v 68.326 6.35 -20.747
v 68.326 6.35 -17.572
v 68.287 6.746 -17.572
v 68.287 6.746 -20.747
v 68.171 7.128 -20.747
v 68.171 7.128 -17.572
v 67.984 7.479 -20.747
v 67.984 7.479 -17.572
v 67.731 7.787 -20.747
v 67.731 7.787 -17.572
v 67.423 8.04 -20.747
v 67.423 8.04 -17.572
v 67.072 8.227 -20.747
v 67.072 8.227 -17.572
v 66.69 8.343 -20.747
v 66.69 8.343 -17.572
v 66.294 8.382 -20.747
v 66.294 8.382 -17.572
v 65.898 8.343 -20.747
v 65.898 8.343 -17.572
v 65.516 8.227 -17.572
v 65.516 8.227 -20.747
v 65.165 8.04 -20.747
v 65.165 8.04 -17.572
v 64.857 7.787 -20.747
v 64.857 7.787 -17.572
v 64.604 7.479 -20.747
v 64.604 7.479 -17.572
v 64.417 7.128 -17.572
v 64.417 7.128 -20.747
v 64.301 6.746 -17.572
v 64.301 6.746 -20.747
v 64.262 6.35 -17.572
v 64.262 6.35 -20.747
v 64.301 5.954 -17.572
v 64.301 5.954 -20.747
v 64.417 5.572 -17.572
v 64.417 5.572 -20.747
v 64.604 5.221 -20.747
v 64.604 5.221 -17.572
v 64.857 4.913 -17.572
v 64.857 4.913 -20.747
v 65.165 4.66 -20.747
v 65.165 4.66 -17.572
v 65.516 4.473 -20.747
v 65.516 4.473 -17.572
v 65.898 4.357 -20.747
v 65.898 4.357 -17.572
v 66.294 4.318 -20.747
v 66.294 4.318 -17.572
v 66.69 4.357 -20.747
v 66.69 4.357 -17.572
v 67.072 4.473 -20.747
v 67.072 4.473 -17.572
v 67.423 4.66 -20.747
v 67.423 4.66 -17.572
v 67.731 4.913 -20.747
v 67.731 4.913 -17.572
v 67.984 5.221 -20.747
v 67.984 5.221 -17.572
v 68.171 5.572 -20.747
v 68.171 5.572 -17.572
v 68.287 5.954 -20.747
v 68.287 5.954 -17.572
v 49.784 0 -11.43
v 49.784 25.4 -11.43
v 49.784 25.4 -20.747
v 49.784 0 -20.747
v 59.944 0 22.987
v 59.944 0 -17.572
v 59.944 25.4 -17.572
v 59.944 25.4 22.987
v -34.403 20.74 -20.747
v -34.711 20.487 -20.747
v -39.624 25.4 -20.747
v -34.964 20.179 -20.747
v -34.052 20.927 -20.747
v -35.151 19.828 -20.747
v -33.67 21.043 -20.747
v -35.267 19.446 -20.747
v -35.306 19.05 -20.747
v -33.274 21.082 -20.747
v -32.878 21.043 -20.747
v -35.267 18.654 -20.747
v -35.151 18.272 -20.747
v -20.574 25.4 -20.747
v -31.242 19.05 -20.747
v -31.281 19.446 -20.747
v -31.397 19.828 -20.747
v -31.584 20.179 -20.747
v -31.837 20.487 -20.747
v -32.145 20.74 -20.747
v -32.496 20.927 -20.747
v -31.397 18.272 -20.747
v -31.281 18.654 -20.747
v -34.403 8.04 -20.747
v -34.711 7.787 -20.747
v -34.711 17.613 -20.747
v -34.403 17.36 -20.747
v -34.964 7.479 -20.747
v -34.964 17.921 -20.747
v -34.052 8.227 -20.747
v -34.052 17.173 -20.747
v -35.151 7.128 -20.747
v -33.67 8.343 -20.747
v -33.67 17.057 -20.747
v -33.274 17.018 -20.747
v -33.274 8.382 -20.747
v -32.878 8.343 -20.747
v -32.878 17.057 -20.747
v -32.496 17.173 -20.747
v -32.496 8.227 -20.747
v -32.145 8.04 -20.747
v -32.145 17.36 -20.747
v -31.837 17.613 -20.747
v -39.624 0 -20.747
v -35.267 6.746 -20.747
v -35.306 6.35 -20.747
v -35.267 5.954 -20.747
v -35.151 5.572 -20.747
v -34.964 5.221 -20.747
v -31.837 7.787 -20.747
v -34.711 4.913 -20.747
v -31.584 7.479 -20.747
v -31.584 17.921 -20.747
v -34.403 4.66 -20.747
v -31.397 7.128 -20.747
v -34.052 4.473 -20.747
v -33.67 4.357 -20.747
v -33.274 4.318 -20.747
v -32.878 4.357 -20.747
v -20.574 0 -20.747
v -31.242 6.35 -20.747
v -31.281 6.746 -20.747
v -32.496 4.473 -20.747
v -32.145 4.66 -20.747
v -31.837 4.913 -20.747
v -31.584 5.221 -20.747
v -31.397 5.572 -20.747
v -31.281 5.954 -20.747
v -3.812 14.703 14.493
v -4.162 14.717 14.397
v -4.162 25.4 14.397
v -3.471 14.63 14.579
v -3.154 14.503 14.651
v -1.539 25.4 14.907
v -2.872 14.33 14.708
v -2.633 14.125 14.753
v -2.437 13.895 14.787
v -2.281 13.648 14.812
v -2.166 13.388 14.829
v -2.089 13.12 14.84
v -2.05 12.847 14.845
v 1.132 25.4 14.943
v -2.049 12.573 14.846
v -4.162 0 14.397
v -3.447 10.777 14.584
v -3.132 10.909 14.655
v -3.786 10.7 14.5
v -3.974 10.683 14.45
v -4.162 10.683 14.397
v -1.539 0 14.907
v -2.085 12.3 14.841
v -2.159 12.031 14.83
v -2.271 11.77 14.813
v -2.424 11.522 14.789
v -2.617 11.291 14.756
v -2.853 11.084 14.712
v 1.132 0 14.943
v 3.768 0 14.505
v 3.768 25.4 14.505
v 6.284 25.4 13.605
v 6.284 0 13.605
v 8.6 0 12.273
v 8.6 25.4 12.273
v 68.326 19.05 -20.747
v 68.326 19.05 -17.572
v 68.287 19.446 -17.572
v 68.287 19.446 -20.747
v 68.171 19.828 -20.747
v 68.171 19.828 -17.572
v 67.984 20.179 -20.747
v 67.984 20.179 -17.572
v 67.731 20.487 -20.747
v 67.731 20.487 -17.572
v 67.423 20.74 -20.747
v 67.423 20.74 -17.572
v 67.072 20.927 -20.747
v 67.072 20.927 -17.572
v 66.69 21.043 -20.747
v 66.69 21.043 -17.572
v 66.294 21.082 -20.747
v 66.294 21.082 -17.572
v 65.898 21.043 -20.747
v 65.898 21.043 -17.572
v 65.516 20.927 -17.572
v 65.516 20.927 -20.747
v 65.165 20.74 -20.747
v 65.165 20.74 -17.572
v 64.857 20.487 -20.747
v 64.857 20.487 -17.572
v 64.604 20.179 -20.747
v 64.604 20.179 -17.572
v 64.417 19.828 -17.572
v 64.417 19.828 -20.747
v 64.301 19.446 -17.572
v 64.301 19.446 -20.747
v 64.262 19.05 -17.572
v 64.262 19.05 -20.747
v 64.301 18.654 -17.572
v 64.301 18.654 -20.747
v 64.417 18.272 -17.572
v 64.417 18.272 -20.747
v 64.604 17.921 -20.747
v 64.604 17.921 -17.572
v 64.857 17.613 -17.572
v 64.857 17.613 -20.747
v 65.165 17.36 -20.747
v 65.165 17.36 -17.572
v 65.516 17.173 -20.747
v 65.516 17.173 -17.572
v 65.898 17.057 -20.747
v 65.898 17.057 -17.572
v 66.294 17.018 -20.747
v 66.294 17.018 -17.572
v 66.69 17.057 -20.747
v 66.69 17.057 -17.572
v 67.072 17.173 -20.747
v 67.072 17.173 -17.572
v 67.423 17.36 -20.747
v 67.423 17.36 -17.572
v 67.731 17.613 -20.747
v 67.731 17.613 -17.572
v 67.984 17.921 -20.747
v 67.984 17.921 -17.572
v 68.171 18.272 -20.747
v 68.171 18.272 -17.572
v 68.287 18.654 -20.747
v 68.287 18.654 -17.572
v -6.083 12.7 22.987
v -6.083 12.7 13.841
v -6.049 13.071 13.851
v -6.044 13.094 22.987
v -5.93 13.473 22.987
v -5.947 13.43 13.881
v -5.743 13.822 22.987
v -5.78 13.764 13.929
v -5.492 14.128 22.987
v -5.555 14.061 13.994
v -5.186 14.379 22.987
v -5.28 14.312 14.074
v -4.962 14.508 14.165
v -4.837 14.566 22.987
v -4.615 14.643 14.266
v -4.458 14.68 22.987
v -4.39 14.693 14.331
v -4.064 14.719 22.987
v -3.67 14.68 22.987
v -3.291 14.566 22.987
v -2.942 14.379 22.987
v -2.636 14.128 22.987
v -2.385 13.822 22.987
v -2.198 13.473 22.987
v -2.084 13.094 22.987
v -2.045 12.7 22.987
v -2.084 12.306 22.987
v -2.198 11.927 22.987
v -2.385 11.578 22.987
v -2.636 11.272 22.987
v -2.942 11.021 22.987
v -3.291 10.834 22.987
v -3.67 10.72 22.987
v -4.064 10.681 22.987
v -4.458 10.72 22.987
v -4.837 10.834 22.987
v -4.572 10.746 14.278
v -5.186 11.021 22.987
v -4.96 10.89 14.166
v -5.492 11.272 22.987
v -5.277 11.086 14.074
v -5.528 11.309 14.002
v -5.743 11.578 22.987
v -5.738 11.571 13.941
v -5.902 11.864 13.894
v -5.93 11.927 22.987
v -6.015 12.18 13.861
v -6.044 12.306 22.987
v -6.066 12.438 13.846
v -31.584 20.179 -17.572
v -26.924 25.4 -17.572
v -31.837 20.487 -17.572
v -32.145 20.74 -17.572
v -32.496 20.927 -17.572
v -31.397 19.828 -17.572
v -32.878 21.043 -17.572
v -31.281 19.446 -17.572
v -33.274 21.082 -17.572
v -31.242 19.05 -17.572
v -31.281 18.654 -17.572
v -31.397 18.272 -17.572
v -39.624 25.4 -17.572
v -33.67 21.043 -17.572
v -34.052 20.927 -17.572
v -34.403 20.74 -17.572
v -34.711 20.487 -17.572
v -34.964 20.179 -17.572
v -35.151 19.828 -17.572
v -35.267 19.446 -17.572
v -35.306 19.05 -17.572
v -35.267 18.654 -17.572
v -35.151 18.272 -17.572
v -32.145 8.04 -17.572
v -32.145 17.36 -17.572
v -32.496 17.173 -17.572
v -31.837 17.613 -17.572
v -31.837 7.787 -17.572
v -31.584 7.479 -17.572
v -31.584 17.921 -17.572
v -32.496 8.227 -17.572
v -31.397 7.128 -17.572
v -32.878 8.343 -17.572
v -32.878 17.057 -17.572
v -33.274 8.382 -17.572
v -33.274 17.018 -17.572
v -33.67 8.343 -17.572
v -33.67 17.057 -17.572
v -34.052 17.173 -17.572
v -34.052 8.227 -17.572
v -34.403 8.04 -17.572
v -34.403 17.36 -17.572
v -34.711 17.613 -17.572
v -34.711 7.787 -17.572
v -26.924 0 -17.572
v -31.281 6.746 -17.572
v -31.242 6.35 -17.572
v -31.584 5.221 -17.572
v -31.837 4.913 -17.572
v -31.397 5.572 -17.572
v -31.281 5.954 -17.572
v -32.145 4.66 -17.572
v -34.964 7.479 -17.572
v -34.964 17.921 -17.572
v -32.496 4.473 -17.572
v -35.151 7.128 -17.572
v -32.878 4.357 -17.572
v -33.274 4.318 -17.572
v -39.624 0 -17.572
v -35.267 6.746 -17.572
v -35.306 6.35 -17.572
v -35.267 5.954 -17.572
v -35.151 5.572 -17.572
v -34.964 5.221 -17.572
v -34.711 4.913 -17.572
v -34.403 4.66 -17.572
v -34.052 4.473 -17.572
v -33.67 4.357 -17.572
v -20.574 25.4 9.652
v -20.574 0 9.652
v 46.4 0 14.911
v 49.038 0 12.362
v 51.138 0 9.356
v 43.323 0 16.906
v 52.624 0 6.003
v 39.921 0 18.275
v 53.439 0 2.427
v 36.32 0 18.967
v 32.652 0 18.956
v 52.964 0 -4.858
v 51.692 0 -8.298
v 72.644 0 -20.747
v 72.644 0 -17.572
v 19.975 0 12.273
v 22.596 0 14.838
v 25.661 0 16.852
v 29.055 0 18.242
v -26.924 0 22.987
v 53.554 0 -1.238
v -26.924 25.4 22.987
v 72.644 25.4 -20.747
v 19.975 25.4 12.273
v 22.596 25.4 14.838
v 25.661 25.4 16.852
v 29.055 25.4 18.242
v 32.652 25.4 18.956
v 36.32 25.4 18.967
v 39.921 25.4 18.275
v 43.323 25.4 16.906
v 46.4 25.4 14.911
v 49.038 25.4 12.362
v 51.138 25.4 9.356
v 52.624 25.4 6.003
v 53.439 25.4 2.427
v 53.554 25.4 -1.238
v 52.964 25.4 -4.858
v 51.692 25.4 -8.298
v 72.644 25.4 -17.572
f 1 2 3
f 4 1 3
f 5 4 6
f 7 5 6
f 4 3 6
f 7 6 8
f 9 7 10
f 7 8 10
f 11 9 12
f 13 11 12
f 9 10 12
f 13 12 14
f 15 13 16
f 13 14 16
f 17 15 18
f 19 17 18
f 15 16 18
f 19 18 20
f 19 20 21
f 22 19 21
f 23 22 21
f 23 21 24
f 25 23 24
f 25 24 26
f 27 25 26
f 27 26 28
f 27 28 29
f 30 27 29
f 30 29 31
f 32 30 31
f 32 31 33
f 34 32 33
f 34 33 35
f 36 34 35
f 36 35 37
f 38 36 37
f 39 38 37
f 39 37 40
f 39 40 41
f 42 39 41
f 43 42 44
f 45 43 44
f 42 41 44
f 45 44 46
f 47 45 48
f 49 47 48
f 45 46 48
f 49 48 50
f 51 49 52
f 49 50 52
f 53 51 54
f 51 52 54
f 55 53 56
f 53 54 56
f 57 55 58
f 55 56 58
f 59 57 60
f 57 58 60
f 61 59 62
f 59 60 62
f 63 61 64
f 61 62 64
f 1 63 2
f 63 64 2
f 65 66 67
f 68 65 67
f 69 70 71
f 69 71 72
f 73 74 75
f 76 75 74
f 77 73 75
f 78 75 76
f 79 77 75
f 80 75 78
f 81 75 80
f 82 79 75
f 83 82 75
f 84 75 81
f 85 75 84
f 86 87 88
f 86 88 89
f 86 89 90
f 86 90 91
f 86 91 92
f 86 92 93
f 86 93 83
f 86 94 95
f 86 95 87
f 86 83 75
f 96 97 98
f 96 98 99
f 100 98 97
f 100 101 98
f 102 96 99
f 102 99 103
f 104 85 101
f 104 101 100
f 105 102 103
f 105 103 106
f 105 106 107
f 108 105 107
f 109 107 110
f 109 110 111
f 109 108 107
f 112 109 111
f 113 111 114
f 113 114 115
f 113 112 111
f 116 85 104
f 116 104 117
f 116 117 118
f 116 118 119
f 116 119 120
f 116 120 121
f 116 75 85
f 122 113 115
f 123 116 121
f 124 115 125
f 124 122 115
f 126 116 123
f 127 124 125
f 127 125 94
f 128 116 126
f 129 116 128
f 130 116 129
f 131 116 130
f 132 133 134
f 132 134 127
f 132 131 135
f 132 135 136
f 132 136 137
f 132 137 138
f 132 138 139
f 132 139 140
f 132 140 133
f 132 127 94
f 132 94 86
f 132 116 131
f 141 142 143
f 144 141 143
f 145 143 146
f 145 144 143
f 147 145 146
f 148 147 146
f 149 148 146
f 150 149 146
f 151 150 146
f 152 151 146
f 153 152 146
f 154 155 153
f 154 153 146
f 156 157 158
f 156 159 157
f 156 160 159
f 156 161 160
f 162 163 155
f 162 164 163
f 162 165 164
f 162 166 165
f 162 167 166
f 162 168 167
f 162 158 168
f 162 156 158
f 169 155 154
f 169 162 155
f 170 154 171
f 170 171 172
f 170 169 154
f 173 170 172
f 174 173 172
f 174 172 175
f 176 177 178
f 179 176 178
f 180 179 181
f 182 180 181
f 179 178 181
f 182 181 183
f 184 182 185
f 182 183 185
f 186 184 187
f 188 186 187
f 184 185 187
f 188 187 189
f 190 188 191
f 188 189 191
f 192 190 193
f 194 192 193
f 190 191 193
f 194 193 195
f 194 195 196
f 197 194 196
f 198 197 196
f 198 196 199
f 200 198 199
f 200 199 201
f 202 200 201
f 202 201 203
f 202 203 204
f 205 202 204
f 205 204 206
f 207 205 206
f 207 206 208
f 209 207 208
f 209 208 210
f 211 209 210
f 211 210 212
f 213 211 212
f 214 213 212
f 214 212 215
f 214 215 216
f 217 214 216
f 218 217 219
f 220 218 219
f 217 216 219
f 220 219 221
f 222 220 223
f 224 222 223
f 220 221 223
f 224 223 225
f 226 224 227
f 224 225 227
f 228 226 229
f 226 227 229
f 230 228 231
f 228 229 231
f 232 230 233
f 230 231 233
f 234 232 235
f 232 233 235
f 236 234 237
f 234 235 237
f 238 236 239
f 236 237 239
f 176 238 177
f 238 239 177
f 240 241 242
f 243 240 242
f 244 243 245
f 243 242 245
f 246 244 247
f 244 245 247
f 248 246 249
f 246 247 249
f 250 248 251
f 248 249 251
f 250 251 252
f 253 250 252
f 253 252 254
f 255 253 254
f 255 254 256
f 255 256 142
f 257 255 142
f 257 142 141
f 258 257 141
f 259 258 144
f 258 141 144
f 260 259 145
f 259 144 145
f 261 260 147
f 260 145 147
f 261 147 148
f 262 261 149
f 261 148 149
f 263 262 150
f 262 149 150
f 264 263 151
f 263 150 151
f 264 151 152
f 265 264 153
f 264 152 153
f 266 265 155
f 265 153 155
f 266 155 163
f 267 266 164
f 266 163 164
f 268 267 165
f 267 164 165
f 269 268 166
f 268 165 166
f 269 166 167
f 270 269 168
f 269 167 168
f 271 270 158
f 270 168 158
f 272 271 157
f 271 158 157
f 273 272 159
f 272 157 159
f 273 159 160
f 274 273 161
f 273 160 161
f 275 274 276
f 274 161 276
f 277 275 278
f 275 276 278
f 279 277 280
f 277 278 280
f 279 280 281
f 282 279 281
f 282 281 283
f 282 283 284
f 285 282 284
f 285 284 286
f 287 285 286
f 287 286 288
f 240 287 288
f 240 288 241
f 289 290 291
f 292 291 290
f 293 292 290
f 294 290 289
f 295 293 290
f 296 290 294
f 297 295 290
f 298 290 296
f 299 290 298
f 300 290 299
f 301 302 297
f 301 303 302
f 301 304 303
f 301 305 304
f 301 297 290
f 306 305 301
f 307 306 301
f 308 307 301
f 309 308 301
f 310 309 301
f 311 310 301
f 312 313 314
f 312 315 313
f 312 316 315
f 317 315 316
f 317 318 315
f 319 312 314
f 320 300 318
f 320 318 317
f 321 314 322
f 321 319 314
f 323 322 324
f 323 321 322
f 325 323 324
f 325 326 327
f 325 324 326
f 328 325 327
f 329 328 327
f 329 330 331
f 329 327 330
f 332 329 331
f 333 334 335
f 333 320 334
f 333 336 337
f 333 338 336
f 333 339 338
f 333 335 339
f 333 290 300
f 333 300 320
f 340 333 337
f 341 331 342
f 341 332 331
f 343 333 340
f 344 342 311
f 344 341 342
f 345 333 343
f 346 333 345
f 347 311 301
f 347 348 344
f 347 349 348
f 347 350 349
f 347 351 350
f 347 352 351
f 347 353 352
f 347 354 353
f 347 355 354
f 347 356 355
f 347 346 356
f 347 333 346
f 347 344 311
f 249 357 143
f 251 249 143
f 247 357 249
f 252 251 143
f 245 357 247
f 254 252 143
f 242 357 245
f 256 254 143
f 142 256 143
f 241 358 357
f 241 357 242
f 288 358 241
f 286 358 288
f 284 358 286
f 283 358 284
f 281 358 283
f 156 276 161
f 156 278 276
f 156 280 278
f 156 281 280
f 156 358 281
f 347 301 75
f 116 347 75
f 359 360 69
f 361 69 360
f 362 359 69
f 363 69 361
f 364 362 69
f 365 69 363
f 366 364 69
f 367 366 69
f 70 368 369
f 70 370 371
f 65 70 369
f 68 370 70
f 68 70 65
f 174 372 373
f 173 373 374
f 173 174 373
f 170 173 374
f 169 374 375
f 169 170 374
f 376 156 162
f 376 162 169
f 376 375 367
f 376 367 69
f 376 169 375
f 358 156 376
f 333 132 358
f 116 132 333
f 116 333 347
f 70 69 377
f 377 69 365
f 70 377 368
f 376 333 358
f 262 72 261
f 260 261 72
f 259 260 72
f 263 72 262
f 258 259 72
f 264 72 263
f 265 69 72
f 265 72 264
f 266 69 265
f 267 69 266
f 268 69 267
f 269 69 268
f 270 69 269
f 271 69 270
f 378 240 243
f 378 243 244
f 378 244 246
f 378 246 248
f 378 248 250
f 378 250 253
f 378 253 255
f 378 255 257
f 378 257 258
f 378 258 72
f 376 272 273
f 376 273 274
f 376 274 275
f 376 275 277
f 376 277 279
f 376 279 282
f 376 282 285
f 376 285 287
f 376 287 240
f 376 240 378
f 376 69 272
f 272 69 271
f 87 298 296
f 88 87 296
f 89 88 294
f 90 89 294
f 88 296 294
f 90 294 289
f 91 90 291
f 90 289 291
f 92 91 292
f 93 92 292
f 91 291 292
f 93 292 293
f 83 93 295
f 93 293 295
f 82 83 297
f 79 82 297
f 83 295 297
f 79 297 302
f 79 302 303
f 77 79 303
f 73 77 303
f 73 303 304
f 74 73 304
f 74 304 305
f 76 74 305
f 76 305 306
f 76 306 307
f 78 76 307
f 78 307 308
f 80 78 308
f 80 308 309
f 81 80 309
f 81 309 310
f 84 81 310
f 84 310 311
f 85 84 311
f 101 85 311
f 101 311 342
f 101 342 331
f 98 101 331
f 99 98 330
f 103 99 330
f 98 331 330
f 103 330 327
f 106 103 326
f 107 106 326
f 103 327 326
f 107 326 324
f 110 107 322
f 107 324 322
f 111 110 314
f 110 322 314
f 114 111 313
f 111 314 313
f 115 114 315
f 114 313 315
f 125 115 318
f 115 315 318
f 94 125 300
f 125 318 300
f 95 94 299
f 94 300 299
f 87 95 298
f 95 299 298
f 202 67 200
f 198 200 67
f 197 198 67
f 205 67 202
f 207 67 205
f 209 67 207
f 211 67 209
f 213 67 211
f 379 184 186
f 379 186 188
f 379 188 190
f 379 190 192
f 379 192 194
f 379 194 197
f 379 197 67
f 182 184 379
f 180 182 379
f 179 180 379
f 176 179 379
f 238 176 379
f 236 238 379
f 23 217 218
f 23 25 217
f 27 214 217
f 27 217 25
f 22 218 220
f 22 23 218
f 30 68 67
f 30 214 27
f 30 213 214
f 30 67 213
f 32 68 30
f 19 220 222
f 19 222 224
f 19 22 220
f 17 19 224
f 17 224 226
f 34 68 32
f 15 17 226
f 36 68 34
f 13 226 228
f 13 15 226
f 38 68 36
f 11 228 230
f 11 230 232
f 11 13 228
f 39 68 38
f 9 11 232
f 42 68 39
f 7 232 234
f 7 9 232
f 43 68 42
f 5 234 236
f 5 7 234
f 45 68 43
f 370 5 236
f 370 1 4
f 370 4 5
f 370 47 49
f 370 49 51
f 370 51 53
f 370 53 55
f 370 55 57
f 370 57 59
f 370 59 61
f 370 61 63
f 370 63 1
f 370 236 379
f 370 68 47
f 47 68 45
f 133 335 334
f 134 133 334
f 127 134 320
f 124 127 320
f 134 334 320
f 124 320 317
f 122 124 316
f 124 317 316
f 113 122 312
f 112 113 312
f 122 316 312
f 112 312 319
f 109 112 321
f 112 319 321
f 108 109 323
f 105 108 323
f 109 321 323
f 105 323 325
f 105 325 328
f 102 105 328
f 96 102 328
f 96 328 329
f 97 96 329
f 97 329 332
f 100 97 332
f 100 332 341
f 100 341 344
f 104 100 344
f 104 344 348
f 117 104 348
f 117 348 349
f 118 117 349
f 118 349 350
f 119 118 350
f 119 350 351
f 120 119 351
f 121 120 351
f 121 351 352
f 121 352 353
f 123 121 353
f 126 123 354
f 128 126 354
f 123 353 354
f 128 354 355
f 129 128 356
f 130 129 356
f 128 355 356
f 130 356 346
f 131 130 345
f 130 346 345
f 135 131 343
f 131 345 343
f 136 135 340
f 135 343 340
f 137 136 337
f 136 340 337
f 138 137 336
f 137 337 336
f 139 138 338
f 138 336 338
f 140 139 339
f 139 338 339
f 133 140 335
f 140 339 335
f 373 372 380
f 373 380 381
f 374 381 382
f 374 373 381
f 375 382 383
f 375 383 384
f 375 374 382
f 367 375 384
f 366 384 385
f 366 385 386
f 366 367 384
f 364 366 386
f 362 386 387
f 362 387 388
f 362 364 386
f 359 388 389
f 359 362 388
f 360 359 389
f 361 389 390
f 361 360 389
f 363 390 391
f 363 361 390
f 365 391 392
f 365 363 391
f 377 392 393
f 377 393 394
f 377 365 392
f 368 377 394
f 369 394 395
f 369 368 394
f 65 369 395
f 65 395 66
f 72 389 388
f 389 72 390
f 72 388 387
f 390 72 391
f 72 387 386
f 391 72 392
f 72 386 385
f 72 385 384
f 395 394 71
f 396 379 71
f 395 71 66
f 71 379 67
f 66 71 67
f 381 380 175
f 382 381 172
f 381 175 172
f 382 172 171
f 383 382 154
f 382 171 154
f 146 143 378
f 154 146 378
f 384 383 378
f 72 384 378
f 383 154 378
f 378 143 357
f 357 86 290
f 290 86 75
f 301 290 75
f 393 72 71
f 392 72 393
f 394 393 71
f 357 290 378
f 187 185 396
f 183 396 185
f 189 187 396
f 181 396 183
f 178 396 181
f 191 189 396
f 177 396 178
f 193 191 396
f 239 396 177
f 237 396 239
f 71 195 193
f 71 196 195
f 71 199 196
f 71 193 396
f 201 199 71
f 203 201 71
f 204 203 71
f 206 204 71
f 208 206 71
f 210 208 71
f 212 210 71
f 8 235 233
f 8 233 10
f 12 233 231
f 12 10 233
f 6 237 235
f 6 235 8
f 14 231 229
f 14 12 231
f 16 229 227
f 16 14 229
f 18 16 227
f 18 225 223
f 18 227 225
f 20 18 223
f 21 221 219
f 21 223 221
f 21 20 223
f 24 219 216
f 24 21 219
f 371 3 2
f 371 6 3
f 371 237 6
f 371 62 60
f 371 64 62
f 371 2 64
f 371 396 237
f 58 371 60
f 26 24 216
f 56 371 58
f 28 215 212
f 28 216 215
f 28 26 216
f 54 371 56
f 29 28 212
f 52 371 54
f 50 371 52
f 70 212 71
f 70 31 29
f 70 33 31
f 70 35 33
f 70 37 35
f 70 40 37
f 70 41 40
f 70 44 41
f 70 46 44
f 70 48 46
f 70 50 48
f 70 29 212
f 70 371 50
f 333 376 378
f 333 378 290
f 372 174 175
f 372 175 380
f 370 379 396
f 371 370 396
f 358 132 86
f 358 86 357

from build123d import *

# Parameters (mm, degrees)
BOSS_EXTRUDE1_DEPTH    = 25.4
SKETCH2_R              = 2.032
CUT_EXTRUDE1_DEPTH     = 87.9904043
F_10_32_TAPPED_HOLE1_D = 4.0386


with BuildPart() as part:
    # Sketch1 → Boss-Extrude1 (new body)
    with BuildSketch(Plane(origin=(0, 0, 0), x_dir=(1, 0, 0), z_dir=(0, 1, 0))):
        with BuildLine():
            Line((-20.574, -9.652129604), (-4.162019583, -14.39674322))
            ThreePointArc((-4.162019583, -14.39674322), (2.459785533, -14.783033433), (8.59971196, -12.273287113))
            Line((8.59971196, -12.273287113), (19.974548279, -12.273287113))
            ThreePointArc((19.974548279, -12.273287113), (46.400384935, -14.910688658), (49.784, 11.43))
            Line((49.784, 11.43), (49.784, 20.746712887))
            Line((49.784, 20.746712887), (72.644, 20.746712887))
            Line((72.644, 20.746712887), (72.644, 17.571712887))
            Line((72.644, 17.571712887), (59.944, 17.571712887))
            Line((59.944, 17.571712887), (59.944, -12.827129604))
            Line((59.944, -12.827129604), (59.944, -22.987129604))
            Line((59.944, -22.987129604), (-26.924, -22.987129604))
            Line((-26.924, -22.987129604), (-26.924, -12.827129604))
            Line((-26.924, -12.827129604), (-26.924, 17.571712887))
            Line((-26.924, 17.571712887), (-39.624, 17.571712887))
            Line((-39.624, 17.571712887), (-39.624, 20.746712887))
            Line((-39.624, 20.746712887), (-20.574, 20.746712887))
            Line((-20.574, 20.746712887), (-20.574, 9.652))
            Line((-20.574, 9.652), (-20.574, -9.652129604))
        make_face()
    extrude(amount=BOSS_EXTRUDE1_DEPTH)

    # Sketch2 → Cut-Extrude1 (cut, through all)
    with BuildSketch(Plane.XY.offset(-17.571712887)):
        with Locations((-33.274, 19.05)):
            Circle(SKETCH2_R)
        with Locations((-33.274, 6.35)):
            Circle(SKETCH2_R)
        with Locations((66.294, 19.05)):
            Circle(SKETCH2_R)
        with Locations((66.294, 6.35)):
            Circle(SKETCH2_R)
    extrude(amount=-CUT_EXTRUDE1_DEPTH, mode=Mode.SUBTRACT)

    # #10-32 Tapped Hole1 (through all)
    with Locations(Plane.XY.offset(22.987129604)):
        with Locations((-4.064, 12.7)):
            Hole(F_10_32_TAPPED_HOLE1_D / 2)


solid = part.part
